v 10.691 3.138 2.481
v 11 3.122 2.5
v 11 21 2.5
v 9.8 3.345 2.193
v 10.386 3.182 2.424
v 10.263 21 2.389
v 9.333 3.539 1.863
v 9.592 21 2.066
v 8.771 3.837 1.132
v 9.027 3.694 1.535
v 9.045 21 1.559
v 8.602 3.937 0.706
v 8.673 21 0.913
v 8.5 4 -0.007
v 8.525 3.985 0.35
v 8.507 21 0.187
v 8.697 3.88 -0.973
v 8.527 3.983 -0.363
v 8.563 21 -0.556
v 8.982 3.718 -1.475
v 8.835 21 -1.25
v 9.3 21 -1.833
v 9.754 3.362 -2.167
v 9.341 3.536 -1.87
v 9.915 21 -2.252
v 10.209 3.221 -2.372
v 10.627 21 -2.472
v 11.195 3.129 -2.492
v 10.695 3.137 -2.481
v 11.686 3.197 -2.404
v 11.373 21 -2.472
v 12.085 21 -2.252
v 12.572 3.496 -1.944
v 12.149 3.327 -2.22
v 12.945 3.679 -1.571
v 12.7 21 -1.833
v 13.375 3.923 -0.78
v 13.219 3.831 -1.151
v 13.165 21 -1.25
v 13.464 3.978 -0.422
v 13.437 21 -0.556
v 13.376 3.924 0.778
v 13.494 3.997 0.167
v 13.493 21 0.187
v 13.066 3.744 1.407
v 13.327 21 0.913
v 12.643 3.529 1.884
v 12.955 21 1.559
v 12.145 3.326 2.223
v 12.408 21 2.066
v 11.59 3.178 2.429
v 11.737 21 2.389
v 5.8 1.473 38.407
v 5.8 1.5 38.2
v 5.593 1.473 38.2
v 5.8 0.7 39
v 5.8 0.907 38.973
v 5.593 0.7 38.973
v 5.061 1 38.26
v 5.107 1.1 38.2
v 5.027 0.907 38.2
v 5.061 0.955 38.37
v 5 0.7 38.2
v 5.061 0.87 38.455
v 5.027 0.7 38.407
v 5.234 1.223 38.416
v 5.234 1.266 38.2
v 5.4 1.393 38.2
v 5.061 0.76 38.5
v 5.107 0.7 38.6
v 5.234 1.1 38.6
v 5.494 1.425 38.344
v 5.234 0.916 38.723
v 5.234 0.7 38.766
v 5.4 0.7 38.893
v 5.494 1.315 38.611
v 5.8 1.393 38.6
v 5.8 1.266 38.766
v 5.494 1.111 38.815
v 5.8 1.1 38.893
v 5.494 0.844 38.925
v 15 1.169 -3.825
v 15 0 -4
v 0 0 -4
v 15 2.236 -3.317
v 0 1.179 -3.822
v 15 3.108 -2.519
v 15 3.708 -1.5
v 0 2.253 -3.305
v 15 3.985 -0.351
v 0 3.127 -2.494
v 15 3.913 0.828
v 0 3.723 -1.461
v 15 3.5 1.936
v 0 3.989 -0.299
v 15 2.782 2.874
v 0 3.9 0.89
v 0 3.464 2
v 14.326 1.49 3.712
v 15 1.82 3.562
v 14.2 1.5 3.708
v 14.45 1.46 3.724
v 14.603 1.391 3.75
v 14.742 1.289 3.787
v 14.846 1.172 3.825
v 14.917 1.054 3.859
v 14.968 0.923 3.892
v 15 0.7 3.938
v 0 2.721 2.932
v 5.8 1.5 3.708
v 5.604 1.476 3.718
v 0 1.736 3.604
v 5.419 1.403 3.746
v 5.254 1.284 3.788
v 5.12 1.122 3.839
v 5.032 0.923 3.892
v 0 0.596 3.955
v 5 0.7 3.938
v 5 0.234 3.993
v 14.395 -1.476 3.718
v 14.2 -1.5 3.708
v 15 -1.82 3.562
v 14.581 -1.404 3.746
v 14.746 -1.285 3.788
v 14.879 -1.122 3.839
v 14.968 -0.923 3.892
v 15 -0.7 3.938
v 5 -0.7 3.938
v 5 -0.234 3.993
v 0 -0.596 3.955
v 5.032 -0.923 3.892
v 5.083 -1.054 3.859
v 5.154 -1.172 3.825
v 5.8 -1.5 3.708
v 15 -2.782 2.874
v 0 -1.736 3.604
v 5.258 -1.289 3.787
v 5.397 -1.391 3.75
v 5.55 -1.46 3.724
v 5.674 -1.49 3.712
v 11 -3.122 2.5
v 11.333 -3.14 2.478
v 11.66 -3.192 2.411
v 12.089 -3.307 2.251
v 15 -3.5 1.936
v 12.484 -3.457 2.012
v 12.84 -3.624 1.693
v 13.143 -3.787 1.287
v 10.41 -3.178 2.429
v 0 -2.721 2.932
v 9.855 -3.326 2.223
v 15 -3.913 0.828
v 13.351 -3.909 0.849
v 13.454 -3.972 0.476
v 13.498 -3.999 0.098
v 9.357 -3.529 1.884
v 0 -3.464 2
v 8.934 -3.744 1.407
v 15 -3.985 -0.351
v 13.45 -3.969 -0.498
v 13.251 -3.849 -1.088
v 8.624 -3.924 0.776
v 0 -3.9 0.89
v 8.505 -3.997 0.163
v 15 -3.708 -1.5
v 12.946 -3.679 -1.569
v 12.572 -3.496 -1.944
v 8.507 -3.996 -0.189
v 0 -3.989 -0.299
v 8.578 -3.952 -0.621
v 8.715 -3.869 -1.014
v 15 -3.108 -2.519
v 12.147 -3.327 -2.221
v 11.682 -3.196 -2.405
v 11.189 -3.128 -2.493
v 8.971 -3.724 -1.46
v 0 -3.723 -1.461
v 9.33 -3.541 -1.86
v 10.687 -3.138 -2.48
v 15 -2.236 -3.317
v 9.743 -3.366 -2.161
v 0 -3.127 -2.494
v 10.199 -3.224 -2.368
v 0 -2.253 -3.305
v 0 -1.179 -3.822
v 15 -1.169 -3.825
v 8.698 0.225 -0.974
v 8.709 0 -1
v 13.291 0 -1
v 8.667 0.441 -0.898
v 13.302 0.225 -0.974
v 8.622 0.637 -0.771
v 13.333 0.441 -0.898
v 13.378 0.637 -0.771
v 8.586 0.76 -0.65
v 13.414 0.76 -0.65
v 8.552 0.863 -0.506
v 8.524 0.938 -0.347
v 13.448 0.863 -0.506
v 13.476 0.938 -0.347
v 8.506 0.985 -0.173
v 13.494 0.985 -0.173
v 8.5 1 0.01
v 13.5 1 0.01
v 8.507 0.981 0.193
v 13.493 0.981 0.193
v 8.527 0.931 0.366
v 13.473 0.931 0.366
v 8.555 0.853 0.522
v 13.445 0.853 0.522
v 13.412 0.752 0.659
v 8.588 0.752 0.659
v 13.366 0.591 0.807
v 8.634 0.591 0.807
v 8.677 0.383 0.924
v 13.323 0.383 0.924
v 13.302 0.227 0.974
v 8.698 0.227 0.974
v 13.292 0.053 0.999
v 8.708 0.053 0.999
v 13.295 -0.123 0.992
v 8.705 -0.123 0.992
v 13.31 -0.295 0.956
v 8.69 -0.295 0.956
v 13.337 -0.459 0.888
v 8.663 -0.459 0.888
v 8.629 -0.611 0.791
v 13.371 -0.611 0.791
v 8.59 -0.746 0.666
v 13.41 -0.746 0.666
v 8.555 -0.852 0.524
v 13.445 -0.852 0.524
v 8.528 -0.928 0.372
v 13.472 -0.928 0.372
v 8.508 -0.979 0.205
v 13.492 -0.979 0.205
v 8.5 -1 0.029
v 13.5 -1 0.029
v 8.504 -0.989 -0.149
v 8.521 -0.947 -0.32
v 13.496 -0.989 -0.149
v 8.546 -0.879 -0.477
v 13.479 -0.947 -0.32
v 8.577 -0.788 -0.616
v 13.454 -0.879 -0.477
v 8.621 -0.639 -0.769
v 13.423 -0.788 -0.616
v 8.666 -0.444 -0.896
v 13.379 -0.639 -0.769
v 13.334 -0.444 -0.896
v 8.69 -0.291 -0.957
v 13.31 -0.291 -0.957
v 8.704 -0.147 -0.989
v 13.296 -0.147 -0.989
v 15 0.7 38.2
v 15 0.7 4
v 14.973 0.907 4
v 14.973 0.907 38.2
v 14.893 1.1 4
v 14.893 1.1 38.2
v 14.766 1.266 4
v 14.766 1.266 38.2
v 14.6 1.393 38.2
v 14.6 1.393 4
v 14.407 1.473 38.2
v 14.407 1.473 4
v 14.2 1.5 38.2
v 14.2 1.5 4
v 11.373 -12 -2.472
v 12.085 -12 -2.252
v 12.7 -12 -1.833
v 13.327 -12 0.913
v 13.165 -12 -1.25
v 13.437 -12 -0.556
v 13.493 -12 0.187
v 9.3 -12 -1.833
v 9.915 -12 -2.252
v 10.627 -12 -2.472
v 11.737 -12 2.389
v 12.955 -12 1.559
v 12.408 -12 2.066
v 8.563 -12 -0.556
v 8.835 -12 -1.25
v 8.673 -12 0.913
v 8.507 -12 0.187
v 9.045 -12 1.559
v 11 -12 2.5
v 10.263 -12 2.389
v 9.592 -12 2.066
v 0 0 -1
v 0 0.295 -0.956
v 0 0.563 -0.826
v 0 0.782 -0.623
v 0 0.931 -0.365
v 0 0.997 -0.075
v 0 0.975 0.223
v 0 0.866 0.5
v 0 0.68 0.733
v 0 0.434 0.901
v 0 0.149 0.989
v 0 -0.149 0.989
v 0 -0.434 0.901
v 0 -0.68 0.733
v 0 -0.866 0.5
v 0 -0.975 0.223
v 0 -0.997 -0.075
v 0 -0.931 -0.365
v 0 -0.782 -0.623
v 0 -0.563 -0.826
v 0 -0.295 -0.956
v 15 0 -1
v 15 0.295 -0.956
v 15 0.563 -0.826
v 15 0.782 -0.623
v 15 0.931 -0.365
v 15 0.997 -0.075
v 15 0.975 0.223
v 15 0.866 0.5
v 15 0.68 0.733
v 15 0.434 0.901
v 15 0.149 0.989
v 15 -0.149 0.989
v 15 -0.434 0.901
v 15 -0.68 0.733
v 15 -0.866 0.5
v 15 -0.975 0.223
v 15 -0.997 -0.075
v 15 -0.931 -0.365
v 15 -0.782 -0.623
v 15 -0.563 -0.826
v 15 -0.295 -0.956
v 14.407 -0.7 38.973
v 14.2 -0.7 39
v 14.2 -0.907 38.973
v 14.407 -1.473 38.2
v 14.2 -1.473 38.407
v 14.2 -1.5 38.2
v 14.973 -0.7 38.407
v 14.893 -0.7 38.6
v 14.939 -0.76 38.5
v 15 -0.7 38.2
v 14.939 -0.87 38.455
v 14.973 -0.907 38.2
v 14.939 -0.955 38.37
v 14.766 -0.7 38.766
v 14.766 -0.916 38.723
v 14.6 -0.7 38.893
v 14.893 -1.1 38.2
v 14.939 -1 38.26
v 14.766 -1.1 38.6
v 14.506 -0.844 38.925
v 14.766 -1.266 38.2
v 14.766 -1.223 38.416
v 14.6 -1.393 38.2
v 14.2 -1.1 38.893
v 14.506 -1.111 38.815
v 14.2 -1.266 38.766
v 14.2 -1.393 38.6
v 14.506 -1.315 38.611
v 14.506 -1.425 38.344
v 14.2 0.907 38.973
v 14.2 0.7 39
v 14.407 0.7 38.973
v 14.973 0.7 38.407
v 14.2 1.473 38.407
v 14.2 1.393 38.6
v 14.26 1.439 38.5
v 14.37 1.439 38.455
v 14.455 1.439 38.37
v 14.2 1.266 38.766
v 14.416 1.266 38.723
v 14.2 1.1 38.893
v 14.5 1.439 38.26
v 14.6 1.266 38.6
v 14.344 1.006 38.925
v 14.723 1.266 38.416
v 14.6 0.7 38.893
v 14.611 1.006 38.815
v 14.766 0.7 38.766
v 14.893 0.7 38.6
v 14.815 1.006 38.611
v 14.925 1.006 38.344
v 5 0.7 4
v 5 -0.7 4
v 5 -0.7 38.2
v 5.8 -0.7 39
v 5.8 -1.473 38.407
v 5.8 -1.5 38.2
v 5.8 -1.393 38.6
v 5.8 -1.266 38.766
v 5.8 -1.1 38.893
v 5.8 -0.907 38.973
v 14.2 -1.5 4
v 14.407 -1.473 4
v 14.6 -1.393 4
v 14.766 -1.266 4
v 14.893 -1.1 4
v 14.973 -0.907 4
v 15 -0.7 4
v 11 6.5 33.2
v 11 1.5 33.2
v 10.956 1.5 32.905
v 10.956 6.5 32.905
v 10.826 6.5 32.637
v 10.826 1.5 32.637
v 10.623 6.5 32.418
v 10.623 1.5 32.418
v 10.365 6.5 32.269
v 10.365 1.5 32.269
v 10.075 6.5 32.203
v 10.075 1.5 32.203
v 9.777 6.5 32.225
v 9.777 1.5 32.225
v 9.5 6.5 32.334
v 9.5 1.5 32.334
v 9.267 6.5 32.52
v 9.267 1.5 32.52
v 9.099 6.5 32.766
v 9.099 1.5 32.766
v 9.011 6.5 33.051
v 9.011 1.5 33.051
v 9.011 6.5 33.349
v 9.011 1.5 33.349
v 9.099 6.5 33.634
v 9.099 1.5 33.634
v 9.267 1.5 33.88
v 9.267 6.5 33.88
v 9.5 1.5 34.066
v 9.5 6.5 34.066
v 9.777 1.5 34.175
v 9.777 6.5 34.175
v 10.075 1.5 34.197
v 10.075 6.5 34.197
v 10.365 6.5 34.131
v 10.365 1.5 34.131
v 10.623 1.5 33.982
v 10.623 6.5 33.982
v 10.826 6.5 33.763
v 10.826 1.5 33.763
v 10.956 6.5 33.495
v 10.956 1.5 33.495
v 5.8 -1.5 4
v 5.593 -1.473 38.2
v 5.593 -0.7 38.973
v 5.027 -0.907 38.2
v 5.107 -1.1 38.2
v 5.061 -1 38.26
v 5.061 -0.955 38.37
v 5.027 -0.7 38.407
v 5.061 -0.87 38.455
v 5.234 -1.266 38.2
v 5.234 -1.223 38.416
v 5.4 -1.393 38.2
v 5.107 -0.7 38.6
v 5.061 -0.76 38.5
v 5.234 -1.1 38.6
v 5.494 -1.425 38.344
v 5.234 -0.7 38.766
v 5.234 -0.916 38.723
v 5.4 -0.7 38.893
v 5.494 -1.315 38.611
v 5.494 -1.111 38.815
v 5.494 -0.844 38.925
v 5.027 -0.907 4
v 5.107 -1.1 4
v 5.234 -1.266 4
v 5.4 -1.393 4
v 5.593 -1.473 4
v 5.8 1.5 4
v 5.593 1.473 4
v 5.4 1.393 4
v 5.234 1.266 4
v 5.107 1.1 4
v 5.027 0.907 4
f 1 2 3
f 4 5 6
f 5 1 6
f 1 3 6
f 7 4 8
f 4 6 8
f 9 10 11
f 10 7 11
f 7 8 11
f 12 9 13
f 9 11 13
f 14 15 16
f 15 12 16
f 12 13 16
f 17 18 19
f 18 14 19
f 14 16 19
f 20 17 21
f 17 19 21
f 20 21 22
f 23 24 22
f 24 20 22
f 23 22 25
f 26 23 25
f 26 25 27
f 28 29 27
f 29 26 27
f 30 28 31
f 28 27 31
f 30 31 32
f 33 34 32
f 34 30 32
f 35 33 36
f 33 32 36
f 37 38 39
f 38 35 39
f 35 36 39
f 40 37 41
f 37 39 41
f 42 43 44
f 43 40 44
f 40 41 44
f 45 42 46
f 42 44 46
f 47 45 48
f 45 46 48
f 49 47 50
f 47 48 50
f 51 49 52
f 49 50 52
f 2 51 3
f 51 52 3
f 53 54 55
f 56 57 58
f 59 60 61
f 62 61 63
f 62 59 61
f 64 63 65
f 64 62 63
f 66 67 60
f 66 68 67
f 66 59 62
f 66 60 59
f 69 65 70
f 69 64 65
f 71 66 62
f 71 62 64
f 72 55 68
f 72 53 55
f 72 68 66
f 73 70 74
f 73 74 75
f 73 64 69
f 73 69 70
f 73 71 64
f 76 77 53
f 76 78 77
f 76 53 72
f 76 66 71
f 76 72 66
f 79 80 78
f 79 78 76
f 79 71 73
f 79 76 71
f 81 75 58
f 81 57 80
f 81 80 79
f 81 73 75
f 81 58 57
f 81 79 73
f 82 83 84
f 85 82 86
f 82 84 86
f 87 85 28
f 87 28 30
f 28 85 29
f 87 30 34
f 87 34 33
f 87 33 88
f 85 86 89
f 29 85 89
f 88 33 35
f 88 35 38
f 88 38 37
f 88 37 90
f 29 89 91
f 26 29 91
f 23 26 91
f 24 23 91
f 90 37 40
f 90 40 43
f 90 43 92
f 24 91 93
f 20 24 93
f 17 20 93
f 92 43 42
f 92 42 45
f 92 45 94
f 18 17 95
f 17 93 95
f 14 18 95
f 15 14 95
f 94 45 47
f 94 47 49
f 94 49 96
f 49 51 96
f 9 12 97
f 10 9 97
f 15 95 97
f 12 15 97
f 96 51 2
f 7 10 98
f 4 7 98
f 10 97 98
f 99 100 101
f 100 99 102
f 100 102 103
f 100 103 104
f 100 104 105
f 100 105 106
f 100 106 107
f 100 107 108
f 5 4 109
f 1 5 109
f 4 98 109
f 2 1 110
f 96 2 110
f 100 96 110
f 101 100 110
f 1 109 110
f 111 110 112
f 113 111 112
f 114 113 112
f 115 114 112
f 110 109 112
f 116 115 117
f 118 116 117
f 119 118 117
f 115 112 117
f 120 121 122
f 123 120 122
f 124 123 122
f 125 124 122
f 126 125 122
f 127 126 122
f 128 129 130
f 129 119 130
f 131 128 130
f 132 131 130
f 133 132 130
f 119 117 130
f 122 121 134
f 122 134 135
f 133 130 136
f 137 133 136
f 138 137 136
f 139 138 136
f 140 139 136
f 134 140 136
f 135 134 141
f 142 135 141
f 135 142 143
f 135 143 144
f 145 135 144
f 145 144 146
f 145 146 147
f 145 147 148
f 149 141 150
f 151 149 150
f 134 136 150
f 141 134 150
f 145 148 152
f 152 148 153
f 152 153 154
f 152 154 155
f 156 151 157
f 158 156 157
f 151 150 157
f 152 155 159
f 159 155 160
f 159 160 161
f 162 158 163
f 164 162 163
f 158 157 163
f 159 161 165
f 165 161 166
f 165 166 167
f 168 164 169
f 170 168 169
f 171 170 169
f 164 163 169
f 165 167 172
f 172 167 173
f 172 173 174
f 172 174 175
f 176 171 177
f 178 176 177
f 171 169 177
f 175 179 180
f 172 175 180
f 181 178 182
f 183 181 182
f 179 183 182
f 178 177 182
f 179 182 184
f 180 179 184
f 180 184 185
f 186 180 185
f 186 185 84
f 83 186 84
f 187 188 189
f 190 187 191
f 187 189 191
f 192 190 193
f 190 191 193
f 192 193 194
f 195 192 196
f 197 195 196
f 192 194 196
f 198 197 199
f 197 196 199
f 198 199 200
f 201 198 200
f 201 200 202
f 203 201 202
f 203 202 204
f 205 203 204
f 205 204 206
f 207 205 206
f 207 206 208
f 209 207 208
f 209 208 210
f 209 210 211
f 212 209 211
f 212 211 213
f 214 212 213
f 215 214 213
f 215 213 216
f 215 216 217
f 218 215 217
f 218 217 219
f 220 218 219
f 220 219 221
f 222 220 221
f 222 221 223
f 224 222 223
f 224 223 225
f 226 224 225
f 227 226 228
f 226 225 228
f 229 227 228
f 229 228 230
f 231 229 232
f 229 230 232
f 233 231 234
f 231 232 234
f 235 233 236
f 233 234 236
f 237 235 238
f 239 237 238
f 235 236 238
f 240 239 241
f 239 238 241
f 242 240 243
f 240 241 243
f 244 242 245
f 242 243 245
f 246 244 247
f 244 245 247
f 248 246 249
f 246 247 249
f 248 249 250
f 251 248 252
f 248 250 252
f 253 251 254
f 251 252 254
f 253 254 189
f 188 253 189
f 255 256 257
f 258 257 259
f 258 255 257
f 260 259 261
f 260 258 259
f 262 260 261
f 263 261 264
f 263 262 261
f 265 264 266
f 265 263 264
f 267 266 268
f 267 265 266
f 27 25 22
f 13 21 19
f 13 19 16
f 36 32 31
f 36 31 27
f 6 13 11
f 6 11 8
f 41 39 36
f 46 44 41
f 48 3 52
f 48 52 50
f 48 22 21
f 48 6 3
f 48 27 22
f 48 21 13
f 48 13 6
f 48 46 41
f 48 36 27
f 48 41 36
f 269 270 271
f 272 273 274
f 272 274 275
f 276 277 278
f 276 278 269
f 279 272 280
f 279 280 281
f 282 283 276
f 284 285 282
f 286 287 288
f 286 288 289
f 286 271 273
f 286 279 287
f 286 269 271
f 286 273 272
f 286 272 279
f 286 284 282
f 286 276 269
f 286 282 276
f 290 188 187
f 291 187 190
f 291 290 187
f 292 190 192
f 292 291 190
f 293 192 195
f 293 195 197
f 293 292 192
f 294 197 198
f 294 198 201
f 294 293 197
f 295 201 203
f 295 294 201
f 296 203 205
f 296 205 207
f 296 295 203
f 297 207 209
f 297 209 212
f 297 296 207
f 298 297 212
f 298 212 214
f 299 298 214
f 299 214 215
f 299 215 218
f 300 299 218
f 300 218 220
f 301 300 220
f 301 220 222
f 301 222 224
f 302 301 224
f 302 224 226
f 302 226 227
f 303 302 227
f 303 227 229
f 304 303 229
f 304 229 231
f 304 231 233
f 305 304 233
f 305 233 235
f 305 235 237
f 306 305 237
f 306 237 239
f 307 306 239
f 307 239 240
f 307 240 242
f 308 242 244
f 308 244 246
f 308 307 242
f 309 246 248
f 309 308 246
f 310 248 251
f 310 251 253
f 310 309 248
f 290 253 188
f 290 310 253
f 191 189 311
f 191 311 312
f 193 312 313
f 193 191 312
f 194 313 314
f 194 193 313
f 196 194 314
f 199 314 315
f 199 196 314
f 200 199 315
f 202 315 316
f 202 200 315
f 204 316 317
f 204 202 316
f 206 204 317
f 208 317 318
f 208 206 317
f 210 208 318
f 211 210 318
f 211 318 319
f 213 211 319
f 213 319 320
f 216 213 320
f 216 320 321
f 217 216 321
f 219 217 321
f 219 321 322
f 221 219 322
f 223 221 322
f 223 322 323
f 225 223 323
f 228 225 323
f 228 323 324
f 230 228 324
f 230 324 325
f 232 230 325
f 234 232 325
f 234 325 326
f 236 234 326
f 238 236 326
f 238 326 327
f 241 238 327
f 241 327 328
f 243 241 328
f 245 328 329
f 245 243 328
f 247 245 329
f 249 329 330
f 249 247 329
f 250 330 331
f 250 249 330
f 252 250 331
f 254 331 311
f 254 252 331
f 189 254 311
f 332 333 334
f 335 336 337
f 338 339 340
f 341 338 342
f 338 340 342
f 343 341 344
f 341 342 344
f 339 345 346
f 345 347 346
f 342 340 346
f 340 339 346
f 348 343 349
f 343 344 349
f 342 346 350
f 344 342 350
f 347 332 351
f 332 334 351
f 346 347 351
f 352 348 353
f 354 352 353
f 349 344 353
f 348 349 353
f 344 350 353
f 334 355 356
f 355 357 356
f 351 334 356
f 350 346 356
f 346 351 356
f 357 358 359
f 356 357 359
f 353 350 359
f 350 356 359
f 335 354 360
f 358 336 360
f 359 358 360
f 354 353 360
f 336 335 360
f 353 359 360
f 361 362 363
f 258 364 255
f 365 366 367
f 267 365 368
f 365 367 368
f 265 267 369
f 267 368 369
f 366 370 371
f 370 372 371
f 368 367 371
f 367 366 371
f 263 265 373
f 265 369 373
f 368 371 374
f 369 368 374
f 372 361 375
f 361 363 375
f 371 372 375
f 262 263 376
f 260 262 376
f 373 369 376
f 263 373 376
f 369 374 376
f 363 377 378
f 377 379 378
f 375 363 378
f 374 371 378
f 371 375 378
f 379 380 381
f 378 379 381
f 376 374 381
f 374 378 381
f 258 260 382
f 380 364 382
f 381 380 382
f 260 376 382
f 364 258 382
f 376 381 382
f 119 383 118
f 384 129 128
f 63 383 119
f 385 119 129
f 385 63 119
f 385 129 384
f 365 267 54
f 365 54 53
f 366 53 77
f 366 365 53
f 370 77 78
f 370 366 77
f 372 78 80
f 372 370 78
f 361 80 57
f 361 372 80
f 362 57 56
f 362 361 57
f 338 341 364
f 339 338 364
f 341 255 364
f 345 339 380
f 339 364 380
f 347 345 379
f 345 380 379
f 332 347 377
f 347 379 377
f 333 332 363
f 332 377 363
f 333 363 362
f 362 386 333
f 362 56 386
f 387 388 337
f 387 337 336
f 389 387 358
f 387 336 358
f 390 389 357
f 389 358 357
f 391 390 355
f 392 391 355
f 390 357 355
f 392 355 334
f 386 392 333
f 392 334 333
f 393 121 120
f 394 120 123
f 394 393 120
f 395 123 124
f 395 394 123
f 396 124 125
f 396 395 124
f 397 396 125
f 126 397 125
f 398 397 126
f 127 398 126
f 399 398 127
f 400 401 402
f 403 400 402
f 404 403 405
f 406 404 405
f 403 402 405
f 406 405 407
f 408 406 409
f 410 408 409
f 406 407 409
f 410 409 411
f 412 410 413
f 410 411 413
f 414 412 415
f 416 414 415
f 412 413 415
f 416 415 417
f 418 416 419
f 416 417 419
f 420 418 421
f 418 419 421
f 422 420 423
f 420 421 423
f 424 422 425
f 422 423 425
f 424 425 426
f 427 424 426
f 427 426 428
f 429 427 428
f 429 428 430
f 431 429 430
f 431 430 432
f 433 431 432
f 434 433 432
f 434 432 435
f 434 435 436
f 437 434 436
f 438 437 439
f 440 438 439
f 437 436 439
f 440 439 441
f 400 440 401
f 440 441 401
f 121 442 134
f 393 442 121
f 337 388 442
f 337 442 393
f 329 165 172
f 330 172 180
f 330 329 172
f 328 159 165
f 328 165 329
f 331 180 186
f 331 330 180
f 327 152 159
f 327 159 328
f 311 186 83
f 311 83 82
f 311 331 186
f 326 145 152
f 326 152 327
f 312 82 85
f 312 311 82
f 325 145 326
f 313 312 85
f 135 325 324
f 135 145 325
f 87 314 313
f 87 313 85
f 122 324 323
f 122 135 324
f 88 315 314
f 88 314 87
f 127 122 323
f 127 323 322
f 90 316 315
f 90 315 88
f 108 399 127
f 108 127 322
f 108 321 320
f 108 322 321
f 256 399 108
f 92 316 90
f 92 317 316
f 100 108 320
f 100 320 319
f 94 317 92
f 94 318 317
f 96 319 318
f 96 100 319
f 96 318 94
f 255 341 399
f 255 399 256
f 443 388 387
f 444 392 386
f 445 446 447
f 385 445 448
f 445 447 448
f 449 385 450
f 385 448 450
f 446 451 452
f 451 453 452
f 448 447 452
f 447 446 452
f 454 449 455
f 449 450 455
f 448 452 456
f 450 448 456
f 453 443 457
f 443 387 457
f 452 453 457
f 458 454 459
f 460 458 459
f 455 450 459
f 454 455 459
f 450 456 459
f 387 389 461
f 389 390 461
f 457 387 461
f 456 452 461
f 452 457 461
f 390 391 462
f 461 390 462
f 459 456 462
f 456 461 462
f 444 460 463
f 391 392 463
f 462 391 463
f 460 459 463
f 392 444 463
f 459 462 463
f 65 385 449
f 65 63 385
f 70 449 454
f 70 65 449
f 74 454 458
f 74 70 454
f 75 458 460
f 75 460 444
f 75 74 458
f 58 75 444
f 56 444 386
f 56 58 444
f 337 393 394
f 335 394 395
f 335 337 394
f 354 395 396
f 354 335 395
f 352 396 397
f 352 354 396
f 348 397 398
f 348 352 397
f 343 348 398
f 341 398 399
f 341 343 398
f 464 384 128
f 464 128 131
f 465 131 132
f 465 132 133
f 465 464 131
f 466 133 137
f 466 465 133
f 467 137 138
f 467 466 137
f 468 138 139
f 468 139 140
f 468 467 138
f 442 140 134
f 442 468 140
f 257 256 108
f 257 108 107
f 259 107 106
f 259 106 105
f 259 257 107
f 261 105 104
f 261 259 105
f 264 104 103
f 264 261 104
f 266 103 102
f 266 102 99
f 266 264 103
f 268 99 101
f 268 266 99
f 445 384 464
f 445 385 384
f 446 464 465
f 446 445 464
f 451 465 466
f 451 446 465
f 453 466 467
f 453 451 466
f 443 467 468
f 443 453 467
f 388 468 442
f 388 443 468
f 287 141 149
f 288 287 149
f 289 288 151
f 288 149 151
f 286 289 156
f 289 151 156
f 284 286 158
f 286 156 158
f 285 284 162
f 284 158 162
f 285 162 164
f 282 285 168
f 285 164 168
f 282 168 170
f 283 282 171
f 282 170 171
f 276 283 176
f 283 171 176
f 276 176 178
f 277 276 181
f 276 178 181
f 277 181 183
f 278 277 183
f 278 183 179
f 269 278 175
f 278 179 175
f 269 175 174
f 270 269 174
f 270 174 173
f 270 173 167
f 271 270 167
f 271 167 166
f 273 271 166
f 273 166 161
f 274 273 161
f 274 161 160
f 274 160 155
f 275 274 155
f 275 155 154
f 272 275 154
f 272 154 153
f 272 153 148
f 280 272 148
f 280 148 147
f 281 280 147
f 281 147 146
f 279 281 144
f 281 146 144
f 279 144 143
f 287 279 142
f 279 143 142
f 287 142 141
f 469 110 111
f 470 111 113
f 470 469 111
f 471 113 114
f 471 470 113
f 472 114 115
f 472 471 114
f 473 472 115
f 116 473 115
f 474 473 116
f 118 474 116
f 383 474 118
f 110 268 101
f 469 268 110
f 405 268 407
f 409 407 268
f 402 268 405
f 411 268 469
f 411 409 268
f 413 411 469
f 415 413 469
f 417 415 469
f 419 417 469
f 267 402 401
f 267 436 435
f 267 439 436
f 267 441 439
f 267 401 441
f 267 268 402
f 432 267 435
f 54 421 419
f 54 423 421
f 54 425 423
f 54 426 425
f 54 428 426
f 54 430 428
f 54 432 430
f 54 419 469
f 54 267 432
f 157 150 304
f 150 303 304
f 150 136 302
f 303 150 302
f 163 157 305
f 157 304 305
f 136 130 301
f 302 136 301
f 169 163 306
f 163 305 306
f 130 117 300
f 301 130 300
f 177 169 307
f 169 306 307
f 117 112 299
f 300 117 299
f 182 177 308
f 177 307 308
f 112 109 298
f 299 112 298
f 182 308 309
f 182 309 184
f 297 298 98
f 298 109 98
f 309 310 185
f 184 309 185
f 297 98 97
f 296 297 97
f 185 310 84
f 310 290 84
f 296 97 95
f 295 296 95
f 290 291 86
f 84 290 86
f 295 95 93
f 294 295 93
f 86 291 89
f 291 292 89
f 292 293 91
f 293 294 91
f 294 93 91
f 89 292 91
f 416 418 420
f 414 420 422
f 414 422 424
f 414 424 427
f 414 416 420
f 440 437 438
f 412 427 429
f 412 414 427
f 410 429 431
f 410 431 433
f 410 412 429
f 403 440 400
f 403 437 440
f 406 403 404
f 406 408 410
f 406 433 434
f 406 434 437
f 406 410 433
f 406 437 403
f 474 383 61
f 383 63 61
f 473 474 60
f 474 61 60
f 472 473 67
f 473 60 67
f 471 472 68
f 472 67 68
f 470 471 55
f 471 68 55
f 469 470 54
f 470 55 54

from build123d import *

# Parameters (mm, degrees)
SKETCH2_R                = 4
SKETCH2_R_2              = 1
BOSS_EXTRUDE1_DEPTH      = 15
SKETCH4_R                = 2.5
BOSS_EXTRUDE2_DEPTH      = 17
SKETCH6_R                = 2.5
BOSS_EXTRUDE3_DEPTH      = 16
SKETCH8_R                = 1
CUT_EXTRUDE1_DEPTH       = 27.115129868
SKETCH10_W               = 10
SKETCH10_H               = 3
BOSS_EXTRUDE4_DEPTH      = 35
FILLET1_R                = 0.8
BOSS_EXTRUDE5_REACH      = 45.486
BOSS_EXTRUDE5_END_RADIUS = 4
SKETCH12_R               = 1
BOSS_EXTRUDE6_DEPTH      = 5


with BuildPart() as part:
    # Sketch2 → Boss-Extrude1 (new body)
    with BuildSketch(Plane(origin=(0, 0, 0), x_dir=(0, 0, -1), z_dir=(1, 0, 0))):
        Circle(SKETCH2_R)
        Circle(SKETCH2_R_2, mode=Mode.SUBTRACT)
    extrude(amount=BOSS_EXTRUDE1_DEPTH)



with BuildPart() as body_2:
    # Sketch4 → Boss-Extrude2 (new body)
    with BuildSketch(Plane(origin=(15, 4, 0), x_dir=(1, 0, 0), z_dir=(0, 1, 0))):
        with Locations(Location((-4, 0, 0), (0, 0, 270))):
            Circle(SKETCH4_R)
    extrude(amount=BOSS_EXTRUDE2_DEPTH)


with BuildPart() as part_1:
    add(part.part)

    add(body_2.part)  # Boss-Extrude3 merges body 2
    # Sketch6 → Boss-Extrude3 (add)
    with BuildSketch(Plane.XZ.offset(-4)):
        with Locations(Location((11, 0, 0), (0, 0, 90))):
            Circle(SKETCH6_R)
    extrude(amount=BOSS_EXTRUDE3_DEPTH)

    # Sketch8 → Cut-Extrude1 (cut, through all)
    with BuildSketch(Plane(origin=(15, 0, 0), x_dir=(0, 0, -1), z_dir=(1, 0, 0))):
        Circle(SKETCH8_R)
    extrude(amount=-CUT_EXTRUDE1_DEPTH, mode=Mode.SUBTRACT)



with BuildPart() as body_2_2:
    # Sketch10 → Boss-Extrude4 (new body)
    with BuildSketch(Plane(origin=(15, 0, 4), x_dir=(1, 0, 0), z_dir=(0, 0, 1))):
        with Locations((-5, 0)):
            Rectangle(SKETCH10_W, SKETCH10_H)
    extrude(amount=BOSS_EXTRUDE4_DEPTH)

    # Fillet1
    fillet1_edges = [body_2_2.edges().sort_by_distance(p)[0] for p in [
        (10, -1.5, 39),
        (15, 0, 39),
        (10, 1.5, 39),
        (15, 1.5, 21.5),
        (15, -1.5, 21.5),
        (5, -1.5, 21.5),
        (5, 1.5, 21.5),
        (5, 0, 39),
    ]]
    fillet(fillet1_edges, radius=FILLET1_R)


with BuildPart() as part_2:
    add(part_1.part)

    add(body_2_2.part)  # Boss-Extrude5 merges body 2 2
    # Boss-Extrude5: up to this cylinder (the profile starts outside it)
    boss_extrude5_end = Plane(origin=(10, 0, 0), z_dir=(-1, 0, 0)) * Cylinder(BOSS_EXTRUDE5_END_RADIUS, 99.972, mode=Mode.PRIVATE)
    # Sketch11 → Boss-Extrude5 (add, up to the surface)
    with BuildSketch(Plane(origin=(15, 0, 4), x_dir=(1, 0, 0), z_dir=(0, 0, 1)), mode=Mode.PRIVATE) as boss_extrude5_sk1:
        with BuildLine():
            Line((-9.2, -1.5), (-0.8, -1.5))
            ThreePointArc((-0.8, -1.5), (-0.234314575, -1.265685425), (0, -0.7))
            Line((0, -0.7), (0, 0.7))
            ThreePointArc((0, 0.7), (-0.234314575, 1.265685425), (-0.8, 1.5))
            Line((-0.8, 1.5), (-9.2, 1.5))
            ThreePointArc((-9.2, 1.5), (-9.765685425, 1.265685425), (-10, 0.7))
            Line((-10, 0.7), (-10, -0.7))
            ThreePointArc((-10, -0.7), (-9.765685425, -1.265685425), (-9.2, -1.5))
        make_face()
    boss_extrude5_tool1 = extrude(boss_extrude5_sk1.sketch, amount=-BOSS_EXTRUDE5_REACH, mode=Mode.PRIVATE) - boss_extrude5_end
    add(boss_extrude5_tool1.solids().sort_by_distance((10, 0, 4))[0])
    add(boss_extrude5_tool1.solids().sort_by_distance((10, 0, 4))[1])

    # Sketch12 → Boss-Extrude6 (add)
    with BuildSketch(Plane(origin=(0, 1.5, 0), x_dir=(1, 0, 0), z_dir=(0, 1, 0))):
        with Locations((10, -33.2)):
            Circle(SKETCH12_R)
    extrude(amount=BOSS_EXTRUDE6_DEPTH)


solid = part_2.part
